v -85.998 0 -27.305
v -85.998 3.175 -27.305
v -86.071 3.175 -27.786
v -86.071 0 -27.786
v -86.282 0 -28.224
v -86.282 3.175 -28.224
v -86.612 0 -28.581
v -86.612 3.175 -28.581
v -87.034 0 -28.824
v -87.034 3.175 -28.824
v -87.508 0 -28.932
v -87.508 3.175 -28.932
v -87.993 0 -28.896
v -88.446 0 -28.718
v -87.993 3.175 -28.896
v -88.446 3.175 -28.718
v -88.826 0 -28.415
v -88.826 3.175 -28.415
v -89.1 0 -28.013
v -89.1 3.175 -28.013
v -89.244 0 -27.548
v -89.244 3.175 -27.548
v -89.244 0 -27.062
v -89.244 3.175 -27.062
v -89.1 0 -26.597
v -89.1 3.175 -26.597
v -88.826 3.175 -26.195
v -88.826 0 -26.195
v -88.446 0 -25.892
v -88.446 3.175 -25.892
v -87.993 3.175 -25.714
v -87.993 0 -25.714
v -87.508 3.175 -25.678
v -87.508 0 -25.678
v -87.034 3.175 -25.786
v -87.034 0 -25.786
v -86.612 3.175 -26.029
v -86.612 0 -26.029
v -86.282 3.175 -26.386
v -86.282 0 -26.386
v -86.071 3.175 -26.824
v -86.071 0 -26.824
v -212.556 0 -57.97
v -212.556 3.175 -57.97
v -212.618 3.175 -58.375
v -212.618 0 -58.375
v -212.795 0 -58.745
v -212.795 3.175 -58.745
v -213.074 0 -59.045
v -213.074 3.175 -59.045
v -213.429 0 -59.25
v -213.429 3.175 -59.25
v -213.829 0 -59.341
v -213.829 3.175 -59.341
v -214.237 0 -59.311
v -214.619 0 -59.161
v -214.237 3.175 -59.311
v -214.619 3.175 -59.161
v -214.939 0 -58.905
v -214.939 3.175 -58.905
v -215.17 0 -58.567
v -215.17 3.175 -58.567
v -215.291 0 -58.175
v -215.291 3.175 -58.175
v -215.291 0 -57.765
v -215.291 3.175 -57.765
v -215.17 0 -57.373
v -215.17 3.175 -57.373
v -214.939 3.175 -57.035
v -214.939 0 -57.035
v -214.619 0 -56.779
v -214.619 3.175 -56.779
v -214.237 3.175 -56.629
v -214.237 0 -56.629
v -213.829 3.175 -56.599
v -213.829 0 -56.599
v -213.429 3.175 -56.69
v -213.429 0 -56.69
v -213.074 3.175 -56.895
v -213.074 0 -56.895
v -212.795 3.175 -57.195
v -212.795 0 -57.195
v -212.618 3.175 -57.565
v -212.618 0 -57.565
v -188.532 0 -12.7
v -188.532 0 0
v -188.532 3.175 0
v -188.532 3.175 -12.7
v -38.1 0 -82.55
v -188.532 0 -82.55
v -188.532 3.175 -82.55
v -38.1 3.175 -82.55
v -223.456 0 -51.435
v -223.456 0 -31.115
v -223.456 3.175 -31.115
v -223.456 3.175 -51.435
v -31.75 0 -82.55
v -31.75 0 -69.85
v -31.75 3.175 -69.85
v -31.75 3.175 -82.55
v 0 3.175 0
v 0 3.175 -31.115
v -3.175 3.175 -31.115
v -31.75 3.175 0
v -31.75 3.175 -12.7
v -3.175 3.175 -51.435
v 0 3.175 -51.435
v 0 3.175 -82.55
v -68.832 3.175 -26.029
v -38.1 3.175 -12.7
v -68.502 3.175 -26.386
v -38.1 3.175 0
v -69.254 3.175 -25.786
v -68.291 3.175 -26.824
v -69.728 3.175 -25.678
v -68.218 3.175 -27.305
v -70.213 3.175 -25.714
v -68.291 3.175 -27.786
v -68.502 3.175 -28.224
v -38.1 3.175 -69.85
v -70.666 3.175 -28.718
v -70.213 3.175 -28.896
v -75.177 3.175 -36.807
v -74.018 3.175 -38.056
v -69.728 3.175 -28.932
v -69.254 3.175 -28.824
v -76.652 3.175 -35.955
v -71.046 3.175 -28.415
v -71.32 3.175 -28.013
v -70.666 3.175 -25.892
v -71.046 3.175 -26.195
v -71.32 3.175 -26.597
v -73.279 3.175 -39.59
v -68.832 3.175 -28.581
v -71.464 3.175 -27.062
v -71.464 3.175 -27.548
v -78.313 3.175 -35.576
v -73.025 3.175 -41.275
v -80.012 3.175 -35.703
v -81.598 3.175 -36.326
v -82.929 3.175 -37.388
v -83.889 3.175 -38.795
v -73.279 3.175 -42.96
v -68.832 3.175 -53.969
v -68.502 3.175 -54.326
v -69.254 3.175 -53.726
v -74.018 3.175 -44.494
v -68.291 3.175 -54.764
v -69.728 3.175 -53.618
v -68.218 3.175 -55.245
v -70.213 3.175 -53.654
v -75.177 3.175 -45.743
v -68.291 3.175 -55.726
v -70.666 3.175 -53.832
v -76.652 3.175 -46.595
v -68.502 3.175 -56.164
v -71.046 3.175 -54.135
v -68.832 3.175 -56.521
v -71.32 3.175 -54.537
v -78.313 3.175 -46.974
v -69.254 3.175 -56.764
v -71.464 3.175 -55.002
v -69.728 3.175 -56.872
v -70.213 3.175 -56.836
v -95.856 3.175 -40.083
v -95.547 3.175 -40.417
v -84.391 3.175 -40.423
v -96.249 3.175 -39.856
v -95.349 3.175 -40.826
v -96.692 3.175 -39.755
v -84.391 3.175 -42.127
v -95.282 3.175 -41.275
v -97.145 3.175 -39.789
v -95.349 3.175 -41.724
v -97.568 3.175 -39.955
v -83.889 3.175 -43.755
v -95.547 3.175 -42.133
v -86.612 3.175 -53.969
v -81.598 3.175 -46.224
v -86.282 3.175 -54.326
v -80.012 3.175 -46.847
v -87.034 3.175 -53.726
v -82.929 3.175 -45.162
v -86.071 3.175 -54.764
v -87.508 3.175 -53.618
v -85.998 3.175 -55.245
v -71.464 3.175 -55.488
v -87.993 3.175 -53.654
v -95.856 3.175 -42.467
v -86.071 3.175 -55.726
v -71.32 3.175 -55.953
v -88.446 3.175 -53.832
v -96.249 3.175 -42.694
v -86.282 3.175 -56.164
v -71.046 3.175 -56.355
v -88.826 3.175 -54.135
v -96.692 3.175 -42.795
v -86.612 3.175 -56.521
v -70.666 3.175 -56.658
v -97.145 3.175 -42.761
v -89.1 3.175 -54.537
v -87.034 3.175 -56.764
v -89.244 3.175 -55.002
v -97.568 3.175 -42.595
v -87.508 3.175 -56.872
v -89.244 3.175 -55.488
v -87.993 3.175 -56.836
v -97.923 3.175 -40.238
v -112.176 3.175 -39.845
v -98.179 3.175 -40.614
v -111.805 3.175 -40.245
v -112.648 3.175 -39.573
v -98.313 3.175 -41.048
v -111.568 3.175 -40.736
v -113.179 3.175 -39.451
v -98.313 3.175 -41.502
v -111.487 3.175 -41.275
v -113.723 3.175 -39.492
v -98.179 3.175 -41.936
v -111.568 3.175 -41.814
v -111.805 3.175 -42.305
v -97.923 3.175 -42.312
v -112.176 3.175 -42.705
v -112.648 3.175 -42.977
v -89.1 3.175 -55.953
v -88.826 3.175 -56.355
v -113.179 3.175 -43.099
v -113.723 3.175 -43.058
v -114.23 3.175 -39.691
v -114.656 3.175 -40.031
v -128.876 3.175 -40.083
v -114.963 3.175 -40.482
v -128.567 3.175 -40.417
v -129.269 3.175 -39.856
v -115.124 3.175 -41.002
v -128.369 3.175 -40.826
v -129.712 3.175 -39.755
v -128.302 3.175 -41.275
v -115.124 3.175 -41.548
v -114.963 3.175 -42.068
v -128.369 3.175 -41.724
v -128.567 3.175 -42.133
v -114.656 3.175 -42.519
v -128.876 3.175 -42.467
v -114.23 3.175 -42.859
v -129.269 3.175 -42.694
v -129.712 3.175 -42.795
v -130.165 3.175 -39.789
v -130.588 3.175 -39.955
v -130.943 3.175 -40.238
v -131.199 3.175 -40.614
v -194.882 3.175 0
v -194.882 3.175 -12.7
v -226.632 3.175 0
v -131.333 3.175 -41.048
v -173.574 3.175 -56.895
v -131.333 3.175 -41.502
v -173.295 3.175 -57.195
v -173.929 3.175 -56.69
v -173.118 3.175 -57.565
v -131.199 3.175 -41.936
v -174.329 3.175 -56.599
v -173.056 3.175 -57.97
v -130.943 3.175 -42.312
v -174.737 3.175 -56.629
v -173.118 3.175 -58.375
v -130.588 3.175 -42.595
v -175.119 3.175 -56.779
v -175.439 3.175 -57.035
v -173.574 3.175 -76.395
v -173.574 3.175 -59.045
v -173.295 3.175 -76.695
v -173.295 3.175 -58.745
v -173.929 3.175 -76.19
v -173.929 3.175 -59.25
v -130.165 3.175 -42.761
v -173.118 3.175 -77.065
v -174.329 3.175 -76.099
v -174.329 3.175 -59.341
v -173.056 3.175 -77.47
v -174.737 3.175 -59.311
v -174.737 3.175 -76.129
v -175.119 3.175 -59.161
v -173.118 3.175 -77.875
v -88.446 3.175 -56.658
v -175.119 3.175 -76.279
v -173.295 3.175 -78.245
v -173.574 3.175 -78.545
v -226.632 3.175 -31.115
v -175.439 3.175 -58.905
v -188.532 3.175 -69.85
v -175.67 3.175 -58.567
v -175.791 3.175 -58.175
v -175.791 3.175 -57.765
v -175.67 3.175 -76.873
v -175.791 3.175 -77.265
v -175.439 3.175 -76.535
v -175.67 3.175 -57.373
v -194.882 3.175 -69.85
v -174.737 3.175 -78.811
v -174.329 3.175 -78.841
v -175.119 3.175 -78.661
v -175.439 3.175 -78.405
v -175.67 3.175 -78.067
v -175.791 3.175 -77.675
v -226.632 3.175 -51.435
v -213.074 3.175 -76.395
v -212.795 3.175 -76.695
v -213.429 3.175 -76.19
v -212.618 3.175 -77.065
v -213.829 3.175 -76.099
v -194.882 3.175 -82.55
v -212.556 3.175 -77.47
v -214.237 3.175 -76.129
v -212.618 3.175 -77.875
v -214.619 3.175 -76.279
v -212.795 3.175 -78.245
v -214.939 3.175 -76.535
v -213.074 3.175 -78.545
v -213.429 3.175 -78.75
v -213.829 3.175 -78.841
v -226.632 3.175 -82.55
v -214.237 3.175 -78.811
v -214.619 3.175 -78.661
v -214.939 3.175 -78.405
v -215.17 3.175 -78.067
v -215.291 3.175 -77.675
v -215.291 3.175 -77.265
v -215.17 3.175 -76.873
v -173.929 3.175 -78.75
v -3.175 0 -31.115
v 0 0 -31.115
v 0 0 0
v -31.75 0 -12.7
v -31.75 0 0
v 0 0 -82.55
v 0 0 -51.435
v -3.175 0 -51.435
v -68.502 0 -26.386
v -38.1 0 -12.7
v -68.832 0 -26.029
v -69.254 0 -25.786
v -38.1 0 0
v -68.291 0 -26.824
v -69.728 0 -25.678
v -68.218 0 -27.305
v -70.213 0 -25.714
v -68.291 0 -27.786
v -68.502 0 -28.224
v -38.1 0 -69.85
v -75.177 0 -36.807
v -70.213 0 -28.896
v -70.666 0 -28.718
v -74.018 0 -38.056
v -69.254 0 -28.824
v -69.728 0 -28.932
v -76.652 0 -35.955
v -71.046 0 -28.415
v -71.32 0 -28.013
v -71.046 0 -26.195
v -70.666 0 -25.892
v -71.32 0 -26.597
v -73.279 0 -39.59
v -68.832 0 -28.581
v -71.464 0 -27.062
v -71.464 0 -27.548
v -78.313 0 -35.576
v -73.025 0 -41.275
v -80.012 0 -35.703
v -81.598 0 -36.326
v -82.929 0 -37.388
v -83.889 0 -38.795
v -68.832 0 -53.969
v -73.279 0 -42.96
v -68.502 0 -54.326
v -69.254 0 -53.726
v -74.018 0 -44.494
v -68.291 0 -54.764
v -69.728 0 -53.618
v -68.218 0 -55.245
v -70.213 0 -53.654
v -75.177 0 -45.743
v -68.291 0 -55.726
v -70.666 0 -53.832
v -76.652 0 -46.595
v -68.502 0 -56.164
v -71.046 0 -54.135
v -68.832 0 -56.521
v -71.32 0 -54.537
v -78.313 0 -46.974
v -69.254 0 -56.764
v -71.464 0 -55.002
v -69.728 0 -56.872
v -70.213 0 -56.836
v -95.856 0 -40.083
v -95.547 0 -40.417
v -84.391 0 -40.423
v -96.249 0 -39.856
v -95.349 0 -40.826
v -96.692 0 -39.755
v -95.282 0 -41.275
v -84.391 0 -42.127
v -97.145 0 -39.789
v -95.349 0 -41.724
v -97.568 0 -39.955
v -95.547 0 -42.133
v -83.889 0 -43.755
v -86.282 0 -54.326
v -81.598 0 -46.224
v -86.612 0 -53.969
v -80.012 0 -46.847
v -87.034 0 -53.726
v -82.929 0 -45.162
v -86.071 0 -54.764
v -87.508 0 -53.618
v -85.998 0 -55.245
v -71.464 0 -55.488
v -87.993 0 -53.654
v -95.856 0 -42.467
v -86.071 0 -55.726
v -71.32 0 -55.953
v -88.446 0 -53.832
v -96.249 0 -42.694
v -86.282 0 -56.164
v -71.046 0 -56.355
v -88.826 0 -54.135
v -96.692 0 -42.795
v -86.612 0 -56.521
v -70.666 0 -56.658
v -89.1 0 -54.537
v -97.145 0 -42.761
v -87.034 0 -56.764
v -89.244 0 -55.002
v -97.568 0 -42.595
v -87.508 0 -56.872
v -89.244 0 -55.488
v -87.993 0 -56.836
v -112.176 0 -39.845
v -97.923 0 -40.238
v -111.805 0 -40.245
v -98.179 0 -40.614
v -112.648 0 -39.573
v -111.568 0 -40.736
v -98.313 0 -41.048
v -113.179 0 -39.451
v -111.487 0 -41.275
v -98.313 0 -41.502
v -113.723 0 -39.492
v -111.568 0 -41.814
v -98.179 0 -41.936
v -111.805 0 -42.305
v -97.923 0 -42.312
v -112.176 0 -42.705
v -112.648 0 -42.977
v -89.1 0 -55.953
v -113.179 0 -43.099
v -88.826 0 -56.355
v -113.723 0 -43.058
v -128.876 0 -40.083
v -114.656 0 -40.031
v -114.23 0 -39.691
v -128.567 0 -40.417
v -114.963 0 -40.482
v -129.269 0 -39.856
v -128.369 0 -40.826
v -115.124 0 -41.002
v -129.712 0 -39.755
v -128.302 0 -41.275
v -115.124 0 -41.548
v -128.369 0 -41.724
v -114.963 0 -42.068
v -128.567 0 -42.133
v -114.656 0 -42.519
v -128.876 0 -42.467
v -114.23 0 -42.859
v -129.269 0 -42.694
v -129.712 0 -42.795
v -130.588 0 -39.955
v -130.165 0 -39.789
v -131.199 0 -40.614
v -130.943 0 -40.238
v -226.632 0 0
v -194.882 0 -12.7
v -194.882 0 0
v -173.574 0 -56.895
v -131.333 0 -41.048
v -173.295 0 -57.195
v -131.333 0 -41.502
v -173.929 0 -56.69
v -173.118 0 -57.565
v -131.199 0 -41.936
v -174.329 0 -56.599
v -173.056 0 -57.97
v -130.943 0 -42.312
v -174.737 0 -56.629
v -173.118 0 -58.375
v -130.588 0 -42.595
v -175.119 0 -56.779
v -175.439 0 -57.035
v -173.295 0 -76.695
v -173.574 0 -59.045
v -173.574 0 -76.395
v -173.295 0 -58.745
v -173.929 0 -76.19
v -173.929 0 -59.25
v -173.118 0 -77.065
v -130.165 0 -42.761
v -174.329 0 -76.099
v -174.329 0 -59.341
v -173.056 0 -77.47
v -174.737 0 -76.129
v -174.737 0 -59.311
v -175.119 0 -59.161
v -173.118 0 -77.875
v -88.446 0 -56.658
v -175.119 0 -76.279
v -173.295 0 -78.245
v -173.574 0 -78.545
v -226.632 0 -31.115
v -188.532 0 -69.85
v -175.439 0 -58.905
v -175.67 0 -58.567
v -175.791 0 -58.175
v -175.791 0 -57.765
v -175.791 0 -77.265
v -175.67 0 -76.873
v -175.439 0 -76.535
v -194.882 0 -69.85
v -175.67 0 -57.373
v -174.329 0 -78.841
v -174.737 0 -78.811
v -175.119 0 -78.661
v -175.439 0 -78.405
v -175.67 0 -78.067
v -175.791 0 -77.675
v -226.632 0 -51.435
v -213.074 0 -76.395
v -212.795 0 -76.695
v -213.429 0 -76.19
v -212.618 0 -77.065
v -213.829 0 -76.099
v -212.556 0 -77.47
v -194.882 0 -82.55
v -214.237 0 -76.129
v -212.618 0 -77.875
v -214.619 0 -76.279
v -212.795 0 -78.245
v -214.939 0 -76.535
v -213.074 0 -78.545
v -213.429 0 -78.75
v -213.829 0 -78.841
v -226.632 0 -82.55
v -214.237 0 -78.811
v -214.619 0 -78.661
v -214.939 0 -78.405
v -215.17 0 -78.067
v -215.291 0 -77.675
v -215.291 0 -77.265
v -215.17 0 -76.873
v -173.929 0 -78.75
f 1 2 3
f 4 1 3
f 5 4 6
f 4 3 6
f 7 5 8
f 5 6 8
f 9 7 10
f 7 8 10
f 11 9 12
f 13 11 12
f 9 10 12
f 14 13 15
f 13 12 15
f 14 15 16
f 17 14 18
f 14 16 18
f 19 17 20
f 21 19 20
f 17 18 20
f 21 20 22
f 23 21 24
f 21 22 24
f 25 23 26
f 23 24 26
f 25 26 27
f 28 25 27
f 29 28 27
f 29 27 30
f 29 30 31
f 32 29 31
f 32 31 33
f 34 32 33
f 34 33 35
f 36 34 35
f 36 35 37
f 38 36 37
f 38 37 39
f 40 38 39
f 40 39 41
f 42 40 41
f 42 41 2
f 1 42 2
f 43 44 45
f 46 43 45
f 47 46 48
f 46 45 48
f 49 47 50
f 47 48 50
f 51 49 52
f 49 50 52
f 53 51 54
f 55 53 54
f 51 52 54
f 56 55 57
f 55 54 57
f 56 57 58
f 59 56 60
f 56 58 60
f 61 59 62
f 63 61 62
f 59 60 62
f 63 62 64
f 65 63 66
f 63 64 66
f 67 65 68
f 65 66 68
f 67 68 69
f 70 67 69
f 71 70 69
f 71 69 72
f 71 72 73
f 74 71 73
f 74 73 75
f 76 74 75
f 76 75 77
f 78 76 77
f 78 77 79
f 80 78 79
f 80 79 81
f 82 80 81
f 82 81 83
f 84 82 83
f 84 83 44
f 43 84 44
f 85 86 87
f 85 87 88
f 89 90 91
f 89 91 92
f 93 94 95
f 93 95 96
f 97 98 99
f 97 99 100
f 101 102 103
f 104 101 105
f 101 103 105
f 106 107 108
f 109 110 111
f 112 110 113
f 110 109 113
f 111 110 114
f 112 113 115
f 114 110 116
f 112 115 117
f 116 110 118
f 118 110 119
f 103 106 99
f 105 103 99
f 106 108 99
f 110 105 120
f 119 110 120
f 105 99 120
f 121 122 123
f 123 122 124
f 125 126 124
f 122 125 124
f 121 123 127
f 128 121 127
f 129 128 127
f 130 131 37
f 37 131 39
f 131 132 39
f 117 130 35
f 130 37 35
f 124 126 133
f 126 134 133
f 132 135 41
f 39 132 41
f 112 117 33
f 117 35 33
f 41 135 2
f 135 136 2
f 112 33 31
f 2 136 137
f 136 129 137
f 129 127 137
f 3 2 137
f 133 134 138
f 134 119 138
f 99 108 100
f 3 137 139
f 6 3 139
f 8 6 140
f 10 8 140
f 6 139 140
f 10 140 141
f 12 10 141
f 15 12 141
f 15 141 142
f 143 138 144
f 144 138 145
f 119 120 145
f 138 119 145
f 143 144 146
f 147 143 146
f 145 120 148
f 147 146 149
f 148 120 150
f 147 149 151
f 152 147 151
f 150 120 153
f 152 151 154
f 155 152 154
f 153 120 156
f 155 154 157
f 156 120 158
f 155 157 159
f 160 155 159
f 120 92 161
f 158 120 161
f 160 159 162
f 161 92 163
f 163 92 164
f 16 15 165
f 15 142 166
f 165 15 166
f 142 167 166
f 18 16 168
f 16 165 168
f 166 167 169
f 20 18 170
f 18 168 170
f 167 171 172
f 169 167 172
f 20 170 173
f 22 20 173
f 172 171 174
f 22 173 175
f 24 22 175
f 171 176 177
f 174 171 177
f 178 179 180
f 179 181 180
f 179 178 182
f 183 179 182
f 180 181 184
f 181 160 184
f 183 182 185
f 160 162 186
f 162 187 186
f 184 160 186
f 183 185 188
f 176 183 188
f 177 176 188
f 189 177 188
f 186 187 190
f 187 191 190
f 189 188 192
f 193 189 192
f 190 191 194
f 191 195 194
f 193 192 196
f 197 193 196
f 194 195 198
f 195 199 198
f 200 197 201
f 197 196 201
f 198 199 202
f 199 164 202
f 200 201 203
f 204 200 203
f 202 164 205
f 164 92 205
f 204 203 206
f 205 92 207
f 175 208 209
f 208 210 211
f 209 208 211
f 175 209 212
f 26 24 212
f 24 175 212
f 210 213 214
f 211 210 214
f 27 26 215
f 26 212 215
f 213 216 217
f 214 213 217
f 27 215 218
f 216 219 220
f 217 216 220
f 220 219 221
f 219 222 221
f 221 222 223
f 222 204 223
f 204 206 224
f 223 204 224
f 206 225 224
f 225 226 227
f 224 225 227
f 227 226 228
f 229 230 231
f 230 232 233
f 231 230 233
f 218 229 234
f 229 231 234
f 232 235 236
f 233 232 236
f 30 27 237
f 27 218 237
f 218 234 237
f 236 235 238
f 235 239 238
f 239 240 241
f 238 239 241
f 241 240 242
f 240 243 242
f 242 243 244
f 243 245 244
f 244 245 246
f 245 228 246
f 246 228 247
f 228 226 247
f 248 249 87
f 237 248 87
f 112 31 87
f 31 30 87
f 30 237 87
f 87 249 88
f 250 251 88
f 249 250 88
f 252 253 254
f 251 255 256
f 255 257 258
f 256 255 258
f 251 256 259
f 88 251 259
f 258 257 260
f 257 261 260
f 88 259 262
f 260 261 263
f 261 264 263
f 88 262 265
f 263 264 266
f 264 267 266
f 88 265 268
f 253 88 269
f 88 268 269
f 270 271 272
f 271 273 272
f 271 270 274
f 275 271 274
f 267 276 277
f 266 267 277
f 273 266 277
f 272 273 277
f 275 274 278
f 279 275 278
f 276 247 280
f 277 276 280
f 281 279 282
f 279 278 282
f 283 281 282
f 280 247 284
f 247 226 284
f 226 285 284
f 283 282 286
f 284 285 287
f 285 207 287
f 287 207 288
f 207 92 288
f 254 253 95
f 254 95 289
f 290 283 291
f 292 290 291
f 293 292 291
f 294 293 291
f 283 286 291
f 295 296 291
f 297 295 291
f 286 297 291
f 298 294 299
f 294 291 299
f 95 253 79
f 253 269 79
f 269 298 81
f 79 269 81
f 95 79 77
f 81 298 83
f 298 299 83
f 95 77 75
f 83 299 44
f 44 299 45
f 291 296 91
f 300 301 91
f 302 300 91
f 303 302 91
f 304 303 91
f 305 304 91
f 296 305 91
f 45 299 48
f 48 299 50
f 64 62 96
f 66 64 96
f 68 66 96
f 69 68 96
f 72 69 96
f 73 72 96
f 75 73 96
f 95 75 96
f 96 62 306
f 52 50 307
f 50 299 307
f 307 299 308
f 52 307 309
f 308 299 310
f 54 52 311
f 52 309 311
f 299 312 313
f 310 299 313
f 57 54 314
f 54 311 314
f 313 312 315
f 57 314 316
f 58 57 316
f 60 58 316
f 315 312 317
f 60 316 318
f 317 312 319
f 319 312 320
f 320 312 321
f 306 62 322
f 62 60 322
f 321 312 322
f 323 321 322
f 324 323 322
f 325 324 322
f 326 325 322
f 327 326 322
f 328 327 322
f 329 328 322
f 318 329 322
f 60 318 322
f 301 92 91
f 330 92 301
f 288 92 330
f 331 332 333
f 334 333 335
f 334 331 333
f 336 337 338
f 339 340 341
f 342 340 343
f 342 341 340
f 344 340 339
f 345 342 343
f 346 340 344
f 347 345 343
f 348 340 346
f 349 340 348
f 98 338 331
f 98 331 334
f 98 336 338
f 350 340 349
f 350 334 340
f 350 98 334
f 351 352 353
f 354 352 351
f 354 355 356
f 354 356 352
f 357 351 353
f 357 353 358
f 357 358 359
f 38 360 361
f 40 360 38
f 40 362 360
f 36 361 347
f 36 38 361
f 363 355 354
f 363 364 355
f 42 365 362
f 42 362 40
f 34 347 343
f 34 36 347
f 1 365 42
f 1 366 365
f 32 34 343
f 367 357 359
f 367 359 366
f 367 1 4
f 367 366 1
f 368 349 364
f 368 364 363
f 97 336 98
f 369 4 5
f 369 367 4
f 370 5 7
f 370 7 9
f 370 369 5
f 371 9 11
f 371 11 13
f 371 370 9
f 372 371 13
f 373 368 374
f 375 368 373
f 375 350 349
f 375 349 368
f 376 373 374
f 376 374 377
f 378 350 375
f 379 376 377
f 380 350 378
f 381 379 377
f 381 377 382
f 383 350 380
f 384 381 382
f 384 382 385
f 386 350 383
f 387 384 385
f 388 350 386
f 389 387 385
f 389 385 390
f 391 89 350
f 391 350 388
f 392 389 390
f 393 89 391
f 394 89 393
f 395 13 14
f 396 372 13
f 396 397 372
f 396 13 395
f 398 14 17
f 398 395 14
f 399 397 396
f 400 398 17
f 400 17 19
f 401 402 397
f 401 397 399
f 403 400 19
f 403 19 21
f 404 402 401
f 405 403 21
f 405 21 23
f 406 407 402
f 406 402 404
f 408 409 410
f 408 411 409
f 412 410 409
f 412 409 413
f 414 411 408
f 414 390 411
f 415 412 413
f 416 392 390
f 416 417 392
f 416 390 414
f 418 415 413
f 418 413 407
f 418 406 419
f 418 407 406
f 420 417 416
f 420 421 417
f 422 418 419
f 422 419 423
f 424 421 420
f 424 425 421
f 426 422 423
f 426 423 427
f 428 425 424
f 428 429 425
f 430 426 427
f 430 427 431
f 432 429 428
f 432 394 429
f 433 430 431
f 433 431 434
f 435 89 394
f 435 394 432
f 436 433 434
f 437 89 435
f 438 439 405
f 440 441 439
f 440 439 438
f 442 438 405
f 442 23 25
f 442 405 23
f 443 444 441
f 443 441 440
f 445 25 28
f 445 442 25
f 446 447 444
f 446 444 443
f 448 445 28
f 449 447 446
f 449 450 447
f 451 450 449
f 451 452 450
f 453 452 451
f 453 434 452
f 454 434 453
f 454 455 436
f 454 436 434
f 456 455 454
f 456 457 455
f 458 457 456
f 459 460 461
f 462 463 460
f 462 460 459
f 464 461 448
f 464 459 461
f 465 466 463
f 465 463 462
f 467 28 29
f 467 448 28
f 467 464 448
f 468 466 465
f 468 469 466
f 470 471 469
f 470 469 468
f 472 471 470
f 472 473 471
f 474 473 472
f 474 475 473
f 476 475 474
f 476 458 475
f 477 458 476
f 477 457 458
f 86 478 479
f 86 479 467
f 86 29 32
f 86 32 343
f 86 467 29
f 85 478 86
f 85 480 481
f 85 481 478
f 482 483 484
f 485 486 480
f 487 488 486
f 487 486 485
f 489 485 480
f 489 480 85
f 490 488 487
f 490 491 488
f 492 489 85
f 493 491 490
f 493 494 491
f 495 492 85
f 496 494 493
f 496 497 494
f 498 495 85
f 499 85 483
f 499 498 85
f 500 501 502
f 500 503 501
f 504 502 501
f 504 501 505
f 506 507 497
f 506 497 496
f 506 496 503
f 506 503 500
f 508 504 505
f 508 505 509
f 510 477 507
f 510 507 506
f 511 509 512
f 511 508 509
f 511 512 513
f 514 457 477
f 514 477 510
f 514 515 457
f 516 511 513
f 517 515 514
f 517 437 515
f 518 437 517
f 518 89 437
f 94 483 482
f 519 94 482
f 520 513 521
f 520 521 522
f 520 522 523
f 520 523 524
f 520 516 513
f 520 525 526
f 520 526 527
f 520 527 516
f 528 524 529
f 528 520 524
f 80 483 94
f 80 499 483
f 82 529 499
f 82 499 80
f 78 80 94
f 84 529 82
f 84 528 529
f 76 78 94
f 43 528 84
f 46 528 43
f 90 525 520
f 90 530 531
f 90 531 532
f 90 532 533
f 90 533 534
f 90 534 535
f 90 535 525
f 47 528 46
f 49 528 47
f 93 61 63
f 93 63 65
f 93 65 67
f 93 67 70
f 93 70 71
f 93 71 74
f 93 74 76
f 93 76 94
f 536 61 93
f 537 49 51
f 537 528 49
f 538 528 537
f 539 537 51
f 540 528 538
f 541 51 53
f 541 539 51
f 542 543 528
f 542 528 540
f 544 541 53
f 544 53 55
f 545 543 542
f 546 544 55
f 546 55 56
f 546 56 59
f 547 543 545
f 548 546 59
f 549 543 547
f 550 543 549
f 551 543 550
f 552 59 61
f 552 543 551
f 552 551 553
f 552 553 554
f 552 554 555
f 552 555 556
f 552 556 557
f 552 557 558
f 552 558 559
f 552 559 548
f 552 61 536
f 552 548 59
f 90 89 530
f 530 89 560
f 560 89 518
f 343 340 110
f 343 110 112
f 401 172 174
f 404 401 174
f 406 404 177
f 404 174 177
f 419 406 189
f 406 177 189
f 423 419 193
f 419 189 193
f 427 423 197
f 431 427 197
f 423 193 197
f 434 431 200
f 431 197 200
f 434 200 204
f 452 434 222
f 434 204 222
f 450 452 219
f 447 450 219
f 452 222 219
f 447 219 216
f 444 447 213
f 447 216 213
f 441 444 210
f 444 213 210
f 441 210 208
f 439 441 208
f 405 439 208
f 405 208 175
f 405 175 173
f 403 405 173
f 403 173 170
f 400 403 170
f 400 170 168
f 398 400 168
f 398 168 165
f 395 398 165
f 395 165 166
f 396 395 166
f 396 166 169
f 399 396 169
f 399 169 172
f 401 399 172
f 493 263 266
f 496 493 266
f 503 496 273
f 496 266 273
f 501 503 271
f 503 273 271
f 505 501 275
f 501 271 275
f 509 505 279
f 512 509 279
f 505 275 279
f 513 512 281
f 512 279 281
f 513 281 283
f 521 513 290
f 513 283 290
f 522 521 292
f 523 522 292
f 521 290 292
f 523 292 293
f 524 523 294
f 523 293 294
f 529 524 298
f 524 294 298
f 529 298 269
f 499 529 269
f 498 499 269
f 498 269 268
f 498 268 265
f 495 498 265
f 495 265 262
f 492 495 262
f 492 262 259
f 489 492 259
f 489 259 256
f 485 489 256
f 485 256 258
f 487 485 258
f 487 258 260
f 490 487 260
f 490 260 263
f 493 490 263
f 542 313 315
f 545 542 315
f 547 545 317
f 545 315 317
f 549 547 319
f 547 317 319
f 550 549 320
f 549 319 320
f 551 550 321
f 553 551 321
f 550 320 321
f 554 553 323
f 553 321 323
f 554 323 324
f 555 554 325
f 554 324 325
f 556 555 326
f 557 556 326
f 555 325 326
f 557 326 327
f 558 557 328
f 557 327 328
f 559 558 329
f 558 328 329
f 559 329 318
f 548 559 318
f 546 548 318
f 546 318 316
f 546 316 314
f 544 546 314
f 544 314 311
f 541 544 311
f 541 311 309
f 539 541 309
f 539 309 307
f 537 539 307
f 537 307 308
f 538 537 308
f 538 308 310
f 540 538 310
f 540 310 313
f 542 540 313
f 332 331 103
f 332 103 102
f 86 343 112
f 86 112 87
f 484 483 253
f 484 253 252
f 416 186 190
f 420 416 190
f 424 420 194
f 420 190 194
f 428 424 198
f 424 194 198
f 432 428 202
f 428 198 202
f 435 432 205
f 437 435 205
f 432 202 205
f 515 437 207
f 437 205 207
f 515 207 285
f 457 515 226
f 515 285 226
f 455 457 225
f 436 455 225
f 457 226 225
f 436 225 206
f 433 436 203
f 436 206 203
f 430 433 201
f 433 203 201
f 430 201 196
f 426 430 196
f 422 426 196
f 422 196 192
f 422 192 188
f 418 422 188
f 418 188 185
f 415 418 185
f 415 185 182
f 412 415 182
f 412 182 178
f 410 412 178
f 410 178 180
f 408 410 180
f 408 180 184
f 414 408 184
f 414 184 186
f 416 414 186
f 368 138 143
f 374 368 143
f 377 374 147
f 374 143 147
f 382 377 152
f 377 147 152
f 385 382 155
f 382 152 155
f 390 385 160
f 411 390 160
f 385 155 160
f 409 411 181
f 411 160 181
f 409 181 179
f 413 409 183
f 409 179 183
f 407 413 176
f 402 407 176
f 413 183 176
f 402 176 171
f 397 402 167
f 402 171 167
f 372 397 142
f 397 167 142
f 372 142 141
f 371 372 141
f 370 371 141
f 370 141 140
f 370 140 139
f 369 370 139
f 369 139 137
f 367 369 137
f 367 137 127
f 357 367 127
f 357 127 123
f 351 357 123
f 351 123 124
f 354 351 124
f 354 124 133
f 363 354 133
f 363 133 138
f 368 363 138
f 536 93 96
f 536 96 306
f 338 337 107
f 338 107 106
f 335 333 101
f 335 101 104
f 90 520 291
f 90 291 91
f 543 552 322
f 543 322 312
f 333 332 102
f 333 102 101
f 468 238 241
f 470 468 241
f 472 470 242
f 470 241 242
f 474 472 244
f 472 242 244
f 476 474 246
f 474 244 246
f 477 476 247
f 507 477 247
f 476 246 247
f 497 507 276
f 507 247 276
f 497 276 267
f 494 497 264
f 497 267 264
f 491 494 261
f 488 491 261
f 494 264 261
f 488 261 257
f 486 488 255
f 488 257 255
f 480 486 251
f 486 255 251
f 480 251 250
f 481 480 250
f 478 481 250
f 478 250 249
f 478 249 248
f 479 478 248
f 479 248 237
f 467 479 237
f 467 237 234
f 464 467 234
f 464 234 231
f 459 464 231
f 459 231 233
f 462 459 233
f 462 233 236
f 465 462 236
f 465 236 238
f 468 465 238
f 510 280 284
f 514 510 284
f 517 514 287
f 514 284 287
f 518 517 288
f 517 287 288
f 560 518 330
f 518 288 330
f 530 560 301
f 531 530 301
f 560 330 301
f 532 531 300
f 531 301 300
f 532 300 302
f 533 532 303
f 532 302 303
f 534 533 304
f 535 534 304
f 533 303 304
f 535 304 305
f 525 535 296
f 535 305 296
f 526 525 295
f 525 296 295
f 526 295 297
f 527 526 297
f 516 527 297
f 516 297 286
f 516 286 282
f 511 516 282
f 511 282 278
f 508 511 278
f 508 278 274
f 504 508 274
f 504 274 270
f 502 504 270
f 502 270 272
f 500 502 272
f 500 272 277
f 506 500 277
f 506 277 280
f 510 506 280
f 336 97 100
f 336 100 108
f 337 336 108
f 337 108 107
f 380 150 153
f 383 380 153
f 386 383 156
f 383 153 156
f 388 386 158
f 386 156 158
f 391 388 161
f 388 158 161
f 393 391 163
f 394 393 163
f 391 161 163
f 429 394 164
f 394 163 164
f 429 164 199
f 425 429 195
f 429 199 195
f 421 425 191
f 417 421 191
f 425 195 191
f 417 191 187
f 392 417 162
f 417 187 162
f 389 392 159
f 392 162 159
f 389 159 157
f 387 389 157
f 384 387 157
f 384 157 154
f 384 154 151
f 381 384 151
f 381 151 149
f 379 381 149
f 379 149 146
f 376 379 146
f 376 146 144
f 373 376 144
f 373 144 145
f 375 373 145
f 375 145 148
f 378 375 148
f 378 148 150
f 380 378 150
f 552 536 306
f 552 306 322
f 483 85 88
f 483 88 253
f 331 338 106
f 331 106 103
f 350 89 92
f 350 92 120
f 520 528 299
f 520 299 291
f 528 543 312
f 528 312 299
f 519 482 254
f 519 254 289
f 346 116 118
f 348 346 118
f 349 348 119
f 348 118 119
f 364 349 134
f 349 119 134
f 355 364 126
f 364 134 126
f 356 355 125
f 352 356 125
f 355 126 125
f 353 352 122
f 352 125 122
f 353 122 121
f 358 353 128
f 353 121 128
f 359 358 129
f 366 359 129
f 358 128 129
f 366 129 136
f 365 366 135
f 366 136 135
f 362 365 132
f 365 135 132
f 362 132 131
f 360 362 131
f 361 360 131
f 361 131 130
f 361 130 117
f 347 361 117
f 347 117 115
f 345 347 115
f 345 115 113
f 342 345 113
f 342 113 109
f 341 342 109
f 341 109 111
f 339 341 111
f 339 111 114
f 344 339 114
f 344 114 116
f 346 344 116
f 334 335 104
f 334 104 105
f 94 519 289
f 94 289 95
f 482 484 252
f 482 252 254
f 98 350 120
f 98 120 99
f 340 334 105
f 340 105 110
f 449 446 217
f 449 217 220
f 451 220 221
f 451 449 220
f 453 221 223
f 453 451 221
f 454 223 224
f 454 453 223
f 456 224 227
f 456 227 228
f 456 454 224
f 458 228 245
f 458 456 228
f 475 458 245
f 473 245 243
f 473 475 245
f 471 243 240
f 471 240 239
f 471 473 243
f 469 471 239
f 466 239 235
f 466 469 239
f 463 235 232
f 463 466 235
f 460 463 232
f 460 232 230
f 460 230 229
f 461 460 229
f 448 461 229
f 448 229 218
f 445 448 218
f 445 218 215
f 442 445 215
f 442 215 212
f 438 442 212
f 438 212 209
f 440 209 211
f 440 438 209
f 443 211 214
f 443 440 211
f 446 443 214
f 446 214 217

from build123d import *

# Parameters (mm, degrees)
SKETCH1_R           = 1.8288
BOSS_EXTRUDE1_DEPTH = 3.175
SKETCH2_R           = 1.63195
SKETCH2_R_2         = 5.715
SKETCH2_R_3         = 1.524
CUT_EXTRUDE1_DEPTH  = 4.175
SKETCH3_R           = 1.375
CUT_EXTRUDE2_DEPTH  = 4.175


with BuildPart() as part:
    # Sketch1 → Boss-Extrude1 (new body)
    with BuildSketch(Plane(origin=(0, 0, 0), x_dir=(1, 0, 0), z_dir=(0, 1, 0))):
        Polygon((-226.6315, 82.55), (-194.8815, 82.55), (-194.8815, 69.85), (-188.5315, 69.85), (-188.5315, 82.55), (-38.1, 82.55), (-38.1, 69.85), (-31.75, 69.85), (-31.75, 82.55), (0, 82.55), (0, 51.435), (-3.175, 51.435), (-3.175, 31.115), (0, 31.115), (0, 0), (-31.75, 0), (-31.75, 12.7), (-38.1, 12.7), (-38.1, 0), (-188.5315, 0), (-188.5315, 12.7), (-194.8815, 12.7), (-194.8815, 0), (-226.6315, 0), (-226.6315, 31.115), (-223.4565, 31.115), (-223.4565, 51.435), (-226.6315, 51.435), align=None)
        with Locations((-113.31575, 41.275)):
            Circle(SKETCH1_R, mode=Mode.SUBTRACT)
    extrude(amount=BOSS_EXTRUDE1_DEPTH)

    # Sketch2 → Cut-Extrude1 (cut, through all)
    with BuildSketch(Plane(origin=(0, 3.175, 0), x_dir=(1, 0, 0), z_dir=(0, 1, 0))):
        with Locations((-87.63, 27.305)):
            Circle(SKETCH2_R)
        with Locations((-69.85, 27.305)):
            Circle(SKETCH2_R)
        with Locations((-69.85, 55.245)):
            Circle(SKETCH2_R)
        with Locations((-87.63, 55.245)):
            Circle(SKETCH2_R)
        with Locations((-78.74, 41.275)):
            Circle(SKETCH2_R_2)
        with Locations((-129.82575, 41.275)):
            Circle(SKETCH2_R_3)
        with Locations((-96.80575, 41.275)):
            Circle(SKETCH2_R_3)
    extrude(amount=-CUT_EXTRUDE1_DEPTH, mode=Mode.SUBTRACT)

    # Sketch3 → Cut-Extrude2 (cut, through all)
    with BuildSketch(Plane(origin=(0, 3.175, 0), x_dir=(1, 0, 0), z_dir=(0, 1, 0))):
        with Locations((-174.4315, 57.97)):
            Circle(SKETCH3_R)
        with Locations((-213.9315, 57.97)):
            Circle(SKETCH3_R)
        with Locations((-213.9315, 77.47)):
            Circle(SKETCH3_R)
        with Locations((-174.4315, 77.47)):
            Circle(SKETCH3_R)
    extrude(amount=-CUT_EXTRUDE2_DEPTH, mode=Mode.SUBTRACT)


solid = part.part
